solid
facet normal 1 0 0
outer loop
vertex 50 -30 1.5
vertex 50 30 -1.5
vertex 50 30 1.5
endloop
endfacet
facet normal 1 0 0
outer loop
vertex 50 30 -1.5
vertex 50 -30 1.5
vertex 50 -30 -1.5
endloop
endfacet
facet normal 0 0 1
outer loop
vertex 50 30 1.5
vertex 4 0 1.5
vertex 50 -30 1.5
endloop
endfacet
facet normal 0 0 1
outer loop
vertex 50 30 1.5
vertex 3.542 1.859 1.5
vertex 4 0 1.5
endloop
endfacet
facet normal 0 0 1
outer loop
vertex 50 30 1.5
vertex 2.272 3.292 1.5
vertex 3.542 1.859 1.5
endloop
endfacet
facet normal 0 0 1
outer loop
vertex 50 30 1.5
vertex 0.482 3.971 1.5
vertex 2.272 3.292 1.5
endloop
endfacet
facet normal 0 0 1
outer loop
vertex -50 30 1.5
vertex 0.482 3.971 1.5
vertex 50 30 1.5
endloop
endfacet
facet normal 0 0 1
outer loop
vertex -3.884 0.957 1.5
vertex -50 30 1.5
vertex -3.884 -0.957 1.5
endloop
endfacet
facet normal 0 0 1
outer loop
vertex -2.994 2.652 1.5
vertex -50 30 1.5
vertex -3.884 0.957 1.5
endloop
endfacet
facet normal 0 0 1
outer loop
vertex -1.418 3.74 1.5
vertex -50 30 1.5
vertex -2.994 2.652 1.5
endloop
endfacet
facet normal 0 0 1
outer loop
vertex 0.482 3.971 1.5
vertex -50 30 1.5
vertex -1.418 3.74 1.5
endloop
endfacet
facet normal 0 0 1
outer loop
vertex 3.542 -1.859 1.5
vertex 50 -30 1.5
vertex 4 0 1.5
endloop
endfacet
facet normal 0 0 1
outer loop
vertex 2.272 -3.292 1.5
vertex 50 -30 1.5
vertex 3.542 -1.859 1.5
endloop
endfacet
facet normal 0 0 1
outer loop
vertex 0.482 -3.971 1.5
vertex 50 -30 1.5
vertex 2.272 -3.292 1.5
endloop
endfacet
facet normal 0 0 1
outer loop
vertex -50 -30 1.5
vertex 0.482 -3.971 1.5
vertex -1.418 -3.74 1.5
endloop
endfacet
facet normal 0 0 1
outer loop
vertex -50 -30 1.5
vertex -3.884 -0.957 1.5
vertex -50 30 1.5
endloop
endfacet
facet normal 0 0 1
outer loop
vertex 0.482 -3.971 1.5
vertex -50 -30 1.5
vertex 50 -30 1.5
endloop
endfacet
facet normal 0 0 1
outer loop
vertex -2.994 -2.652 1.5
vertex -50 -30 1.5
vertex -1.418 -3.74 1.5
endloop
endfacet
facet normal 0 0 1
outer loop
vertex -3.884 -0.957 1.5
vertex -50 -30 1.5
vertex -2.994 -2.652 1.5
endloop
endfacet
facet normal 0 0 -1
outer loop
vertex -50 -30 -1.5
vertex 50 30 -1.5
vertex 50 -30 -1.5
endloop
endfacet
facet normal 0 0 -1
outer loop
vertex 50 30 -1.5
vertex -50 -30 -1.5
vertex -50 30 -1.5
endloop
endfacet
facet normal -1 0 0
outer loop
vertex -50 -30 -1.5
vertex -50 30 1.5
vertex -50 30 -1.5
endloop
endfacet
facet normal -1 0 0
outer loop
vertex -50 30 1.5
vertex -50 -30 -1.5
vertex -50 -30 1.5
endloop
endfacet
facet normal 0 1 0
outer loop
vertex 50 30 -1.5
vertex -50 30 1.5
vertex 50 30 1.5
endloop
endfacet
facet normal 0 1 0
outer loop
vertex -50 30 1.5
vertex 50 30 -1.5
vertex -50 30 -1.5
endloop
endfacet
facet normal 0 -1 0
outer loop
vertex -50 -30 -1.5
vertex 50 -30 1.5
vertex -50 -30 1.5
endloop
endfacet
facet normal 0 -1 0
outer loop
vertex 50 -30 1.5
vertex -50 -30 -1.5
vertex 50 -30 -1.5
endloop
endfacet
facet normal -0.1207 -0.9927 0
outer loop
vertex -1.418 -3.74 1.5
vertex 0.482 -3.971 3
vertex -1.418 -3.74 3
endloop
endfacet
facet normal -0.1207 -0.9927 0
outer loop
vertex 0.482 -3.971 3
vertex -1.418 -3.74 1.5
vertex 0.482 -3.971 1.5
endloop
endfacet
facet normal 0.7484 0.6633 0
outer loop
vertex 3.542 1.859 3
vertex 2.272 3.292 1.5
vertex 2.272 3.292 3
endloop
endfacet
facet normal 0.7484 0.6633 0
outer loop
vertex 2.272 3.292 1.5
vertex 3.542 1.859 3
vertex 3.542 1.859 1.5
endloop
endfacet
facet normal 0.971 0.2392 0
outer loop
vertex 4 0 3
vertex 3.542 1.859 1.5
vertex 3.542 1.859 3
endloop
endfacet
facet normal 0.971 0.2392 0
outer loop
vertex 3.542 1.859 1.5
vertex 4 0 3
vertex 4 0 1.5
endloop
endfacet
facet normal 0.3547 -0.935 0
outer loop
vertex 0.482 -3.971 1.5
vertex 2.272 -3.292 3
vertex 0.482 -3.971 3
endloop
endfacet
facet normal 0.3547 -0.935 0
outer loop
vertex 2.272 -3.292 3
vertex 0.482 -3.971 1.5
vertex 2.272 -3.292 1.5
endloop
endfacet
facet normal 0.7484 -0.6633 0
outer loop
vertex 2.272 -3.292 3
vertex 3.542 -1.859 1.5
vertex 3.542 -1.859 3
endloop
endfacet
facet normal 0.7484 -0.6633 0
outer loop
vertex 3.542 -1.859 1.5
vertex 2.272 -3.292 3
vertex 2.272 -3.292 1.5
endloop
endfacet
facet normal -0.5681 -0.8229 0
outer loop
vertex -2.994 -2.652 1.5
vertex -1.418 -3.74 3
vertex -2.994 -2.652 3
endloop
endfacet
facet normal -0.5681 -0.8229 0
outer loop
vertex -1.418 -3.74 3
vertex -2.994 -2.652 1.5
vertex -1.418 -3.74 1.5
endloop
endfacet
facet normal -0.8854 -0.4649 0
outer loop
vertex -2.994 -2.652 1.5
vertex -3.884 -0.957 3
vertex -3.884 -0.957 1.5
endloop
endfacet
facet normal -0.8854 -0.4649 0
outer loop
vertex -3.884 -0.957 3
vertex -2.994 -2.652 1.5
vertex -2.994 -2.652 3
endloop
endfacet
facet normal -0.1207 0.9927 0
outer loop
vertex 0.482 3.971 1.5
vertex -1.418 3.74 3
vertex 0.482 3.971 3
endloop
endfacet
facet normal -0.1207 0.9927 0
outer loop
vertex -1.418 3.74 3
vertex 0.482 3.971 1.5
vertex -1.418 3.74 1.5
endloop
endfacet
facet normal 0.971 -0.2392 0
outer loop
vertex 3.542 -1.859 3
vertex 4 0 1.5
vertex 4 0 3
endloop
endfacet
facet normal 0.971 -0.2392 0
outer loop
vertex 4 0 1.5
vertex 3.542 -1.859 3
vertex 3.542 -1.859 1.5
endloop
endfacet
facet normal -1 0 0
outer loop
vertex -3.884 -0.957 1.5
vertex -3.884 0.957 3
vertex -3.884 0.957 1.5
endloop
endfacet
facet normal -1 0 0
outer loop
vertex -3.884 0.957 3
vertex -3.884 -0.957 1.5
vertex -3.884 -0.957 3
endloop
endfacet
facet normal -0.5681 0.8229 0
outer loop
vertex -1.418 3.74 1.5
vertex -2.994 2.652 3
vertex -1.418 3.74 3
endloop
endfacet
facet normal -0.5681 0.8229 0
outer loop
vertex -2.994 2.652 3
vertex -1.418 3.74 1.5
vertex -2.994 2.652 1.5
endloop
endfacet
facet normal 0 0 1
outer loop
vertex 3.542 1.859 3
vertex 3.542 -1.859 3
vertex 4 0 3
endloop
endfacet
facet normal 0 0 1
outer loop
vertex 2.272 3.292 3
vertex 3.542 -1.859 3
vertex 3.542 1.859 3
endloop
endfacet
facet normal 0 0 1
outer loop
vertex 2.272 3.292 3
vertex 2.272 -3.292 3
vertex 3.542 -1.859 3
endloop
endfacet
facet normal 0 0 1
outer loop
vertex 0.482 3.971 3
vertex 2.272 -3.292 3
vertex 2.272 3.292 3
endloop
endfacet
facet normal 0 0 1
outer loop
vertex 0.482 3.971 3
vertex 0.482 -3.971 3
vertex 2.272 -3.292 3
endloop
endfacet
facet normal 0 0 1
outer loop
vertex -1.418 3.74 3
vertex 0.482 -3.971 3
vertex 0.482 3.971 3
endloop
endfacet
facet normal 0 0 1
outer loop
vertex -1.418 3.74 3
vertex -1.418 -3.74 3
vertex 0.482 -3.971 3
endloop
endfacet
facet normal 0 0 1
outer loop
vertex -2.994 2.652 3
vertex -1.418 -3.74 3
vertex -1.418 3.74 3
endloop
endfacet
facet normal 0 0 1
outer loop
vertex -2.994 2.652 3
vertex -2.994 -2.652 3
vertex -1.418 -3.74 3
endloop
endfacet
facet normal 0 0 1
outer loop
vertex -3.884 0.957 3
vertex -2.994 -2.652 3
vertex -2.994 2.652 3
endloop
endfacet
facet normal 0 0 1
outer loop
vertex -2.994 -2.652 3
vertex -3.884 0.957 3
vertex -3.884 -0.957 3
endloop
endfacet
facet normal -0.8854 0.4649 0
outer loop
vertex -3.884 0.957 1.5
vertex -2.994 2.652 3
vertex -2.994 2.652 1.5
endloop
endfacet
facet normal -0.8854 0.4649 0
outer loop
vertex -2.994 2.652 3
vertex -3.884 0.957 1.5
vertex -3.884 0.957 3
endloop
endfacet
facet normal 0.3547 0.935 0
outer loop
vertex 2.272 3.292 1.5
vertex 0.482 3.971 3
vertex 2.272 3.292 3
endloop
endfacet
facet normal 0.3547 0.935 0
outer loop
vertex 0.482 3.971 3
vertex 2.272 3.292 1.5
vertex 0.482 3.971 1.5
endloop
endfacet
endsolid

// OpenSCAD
material_height = 3;
rod_diameter = 8;
linear_diameter = 15;
f = 30;

main();

module main(){

    side();

}


module side()
{
    side_x = 100;
    side_y = 60;
    cube([side_x, side_y, material_height], center=true);

    rod_holder();
}


module rod_holder()
{
    linear_extrude(height=material_height)
    circle(r=rod_diameter/2, center=true);
}
